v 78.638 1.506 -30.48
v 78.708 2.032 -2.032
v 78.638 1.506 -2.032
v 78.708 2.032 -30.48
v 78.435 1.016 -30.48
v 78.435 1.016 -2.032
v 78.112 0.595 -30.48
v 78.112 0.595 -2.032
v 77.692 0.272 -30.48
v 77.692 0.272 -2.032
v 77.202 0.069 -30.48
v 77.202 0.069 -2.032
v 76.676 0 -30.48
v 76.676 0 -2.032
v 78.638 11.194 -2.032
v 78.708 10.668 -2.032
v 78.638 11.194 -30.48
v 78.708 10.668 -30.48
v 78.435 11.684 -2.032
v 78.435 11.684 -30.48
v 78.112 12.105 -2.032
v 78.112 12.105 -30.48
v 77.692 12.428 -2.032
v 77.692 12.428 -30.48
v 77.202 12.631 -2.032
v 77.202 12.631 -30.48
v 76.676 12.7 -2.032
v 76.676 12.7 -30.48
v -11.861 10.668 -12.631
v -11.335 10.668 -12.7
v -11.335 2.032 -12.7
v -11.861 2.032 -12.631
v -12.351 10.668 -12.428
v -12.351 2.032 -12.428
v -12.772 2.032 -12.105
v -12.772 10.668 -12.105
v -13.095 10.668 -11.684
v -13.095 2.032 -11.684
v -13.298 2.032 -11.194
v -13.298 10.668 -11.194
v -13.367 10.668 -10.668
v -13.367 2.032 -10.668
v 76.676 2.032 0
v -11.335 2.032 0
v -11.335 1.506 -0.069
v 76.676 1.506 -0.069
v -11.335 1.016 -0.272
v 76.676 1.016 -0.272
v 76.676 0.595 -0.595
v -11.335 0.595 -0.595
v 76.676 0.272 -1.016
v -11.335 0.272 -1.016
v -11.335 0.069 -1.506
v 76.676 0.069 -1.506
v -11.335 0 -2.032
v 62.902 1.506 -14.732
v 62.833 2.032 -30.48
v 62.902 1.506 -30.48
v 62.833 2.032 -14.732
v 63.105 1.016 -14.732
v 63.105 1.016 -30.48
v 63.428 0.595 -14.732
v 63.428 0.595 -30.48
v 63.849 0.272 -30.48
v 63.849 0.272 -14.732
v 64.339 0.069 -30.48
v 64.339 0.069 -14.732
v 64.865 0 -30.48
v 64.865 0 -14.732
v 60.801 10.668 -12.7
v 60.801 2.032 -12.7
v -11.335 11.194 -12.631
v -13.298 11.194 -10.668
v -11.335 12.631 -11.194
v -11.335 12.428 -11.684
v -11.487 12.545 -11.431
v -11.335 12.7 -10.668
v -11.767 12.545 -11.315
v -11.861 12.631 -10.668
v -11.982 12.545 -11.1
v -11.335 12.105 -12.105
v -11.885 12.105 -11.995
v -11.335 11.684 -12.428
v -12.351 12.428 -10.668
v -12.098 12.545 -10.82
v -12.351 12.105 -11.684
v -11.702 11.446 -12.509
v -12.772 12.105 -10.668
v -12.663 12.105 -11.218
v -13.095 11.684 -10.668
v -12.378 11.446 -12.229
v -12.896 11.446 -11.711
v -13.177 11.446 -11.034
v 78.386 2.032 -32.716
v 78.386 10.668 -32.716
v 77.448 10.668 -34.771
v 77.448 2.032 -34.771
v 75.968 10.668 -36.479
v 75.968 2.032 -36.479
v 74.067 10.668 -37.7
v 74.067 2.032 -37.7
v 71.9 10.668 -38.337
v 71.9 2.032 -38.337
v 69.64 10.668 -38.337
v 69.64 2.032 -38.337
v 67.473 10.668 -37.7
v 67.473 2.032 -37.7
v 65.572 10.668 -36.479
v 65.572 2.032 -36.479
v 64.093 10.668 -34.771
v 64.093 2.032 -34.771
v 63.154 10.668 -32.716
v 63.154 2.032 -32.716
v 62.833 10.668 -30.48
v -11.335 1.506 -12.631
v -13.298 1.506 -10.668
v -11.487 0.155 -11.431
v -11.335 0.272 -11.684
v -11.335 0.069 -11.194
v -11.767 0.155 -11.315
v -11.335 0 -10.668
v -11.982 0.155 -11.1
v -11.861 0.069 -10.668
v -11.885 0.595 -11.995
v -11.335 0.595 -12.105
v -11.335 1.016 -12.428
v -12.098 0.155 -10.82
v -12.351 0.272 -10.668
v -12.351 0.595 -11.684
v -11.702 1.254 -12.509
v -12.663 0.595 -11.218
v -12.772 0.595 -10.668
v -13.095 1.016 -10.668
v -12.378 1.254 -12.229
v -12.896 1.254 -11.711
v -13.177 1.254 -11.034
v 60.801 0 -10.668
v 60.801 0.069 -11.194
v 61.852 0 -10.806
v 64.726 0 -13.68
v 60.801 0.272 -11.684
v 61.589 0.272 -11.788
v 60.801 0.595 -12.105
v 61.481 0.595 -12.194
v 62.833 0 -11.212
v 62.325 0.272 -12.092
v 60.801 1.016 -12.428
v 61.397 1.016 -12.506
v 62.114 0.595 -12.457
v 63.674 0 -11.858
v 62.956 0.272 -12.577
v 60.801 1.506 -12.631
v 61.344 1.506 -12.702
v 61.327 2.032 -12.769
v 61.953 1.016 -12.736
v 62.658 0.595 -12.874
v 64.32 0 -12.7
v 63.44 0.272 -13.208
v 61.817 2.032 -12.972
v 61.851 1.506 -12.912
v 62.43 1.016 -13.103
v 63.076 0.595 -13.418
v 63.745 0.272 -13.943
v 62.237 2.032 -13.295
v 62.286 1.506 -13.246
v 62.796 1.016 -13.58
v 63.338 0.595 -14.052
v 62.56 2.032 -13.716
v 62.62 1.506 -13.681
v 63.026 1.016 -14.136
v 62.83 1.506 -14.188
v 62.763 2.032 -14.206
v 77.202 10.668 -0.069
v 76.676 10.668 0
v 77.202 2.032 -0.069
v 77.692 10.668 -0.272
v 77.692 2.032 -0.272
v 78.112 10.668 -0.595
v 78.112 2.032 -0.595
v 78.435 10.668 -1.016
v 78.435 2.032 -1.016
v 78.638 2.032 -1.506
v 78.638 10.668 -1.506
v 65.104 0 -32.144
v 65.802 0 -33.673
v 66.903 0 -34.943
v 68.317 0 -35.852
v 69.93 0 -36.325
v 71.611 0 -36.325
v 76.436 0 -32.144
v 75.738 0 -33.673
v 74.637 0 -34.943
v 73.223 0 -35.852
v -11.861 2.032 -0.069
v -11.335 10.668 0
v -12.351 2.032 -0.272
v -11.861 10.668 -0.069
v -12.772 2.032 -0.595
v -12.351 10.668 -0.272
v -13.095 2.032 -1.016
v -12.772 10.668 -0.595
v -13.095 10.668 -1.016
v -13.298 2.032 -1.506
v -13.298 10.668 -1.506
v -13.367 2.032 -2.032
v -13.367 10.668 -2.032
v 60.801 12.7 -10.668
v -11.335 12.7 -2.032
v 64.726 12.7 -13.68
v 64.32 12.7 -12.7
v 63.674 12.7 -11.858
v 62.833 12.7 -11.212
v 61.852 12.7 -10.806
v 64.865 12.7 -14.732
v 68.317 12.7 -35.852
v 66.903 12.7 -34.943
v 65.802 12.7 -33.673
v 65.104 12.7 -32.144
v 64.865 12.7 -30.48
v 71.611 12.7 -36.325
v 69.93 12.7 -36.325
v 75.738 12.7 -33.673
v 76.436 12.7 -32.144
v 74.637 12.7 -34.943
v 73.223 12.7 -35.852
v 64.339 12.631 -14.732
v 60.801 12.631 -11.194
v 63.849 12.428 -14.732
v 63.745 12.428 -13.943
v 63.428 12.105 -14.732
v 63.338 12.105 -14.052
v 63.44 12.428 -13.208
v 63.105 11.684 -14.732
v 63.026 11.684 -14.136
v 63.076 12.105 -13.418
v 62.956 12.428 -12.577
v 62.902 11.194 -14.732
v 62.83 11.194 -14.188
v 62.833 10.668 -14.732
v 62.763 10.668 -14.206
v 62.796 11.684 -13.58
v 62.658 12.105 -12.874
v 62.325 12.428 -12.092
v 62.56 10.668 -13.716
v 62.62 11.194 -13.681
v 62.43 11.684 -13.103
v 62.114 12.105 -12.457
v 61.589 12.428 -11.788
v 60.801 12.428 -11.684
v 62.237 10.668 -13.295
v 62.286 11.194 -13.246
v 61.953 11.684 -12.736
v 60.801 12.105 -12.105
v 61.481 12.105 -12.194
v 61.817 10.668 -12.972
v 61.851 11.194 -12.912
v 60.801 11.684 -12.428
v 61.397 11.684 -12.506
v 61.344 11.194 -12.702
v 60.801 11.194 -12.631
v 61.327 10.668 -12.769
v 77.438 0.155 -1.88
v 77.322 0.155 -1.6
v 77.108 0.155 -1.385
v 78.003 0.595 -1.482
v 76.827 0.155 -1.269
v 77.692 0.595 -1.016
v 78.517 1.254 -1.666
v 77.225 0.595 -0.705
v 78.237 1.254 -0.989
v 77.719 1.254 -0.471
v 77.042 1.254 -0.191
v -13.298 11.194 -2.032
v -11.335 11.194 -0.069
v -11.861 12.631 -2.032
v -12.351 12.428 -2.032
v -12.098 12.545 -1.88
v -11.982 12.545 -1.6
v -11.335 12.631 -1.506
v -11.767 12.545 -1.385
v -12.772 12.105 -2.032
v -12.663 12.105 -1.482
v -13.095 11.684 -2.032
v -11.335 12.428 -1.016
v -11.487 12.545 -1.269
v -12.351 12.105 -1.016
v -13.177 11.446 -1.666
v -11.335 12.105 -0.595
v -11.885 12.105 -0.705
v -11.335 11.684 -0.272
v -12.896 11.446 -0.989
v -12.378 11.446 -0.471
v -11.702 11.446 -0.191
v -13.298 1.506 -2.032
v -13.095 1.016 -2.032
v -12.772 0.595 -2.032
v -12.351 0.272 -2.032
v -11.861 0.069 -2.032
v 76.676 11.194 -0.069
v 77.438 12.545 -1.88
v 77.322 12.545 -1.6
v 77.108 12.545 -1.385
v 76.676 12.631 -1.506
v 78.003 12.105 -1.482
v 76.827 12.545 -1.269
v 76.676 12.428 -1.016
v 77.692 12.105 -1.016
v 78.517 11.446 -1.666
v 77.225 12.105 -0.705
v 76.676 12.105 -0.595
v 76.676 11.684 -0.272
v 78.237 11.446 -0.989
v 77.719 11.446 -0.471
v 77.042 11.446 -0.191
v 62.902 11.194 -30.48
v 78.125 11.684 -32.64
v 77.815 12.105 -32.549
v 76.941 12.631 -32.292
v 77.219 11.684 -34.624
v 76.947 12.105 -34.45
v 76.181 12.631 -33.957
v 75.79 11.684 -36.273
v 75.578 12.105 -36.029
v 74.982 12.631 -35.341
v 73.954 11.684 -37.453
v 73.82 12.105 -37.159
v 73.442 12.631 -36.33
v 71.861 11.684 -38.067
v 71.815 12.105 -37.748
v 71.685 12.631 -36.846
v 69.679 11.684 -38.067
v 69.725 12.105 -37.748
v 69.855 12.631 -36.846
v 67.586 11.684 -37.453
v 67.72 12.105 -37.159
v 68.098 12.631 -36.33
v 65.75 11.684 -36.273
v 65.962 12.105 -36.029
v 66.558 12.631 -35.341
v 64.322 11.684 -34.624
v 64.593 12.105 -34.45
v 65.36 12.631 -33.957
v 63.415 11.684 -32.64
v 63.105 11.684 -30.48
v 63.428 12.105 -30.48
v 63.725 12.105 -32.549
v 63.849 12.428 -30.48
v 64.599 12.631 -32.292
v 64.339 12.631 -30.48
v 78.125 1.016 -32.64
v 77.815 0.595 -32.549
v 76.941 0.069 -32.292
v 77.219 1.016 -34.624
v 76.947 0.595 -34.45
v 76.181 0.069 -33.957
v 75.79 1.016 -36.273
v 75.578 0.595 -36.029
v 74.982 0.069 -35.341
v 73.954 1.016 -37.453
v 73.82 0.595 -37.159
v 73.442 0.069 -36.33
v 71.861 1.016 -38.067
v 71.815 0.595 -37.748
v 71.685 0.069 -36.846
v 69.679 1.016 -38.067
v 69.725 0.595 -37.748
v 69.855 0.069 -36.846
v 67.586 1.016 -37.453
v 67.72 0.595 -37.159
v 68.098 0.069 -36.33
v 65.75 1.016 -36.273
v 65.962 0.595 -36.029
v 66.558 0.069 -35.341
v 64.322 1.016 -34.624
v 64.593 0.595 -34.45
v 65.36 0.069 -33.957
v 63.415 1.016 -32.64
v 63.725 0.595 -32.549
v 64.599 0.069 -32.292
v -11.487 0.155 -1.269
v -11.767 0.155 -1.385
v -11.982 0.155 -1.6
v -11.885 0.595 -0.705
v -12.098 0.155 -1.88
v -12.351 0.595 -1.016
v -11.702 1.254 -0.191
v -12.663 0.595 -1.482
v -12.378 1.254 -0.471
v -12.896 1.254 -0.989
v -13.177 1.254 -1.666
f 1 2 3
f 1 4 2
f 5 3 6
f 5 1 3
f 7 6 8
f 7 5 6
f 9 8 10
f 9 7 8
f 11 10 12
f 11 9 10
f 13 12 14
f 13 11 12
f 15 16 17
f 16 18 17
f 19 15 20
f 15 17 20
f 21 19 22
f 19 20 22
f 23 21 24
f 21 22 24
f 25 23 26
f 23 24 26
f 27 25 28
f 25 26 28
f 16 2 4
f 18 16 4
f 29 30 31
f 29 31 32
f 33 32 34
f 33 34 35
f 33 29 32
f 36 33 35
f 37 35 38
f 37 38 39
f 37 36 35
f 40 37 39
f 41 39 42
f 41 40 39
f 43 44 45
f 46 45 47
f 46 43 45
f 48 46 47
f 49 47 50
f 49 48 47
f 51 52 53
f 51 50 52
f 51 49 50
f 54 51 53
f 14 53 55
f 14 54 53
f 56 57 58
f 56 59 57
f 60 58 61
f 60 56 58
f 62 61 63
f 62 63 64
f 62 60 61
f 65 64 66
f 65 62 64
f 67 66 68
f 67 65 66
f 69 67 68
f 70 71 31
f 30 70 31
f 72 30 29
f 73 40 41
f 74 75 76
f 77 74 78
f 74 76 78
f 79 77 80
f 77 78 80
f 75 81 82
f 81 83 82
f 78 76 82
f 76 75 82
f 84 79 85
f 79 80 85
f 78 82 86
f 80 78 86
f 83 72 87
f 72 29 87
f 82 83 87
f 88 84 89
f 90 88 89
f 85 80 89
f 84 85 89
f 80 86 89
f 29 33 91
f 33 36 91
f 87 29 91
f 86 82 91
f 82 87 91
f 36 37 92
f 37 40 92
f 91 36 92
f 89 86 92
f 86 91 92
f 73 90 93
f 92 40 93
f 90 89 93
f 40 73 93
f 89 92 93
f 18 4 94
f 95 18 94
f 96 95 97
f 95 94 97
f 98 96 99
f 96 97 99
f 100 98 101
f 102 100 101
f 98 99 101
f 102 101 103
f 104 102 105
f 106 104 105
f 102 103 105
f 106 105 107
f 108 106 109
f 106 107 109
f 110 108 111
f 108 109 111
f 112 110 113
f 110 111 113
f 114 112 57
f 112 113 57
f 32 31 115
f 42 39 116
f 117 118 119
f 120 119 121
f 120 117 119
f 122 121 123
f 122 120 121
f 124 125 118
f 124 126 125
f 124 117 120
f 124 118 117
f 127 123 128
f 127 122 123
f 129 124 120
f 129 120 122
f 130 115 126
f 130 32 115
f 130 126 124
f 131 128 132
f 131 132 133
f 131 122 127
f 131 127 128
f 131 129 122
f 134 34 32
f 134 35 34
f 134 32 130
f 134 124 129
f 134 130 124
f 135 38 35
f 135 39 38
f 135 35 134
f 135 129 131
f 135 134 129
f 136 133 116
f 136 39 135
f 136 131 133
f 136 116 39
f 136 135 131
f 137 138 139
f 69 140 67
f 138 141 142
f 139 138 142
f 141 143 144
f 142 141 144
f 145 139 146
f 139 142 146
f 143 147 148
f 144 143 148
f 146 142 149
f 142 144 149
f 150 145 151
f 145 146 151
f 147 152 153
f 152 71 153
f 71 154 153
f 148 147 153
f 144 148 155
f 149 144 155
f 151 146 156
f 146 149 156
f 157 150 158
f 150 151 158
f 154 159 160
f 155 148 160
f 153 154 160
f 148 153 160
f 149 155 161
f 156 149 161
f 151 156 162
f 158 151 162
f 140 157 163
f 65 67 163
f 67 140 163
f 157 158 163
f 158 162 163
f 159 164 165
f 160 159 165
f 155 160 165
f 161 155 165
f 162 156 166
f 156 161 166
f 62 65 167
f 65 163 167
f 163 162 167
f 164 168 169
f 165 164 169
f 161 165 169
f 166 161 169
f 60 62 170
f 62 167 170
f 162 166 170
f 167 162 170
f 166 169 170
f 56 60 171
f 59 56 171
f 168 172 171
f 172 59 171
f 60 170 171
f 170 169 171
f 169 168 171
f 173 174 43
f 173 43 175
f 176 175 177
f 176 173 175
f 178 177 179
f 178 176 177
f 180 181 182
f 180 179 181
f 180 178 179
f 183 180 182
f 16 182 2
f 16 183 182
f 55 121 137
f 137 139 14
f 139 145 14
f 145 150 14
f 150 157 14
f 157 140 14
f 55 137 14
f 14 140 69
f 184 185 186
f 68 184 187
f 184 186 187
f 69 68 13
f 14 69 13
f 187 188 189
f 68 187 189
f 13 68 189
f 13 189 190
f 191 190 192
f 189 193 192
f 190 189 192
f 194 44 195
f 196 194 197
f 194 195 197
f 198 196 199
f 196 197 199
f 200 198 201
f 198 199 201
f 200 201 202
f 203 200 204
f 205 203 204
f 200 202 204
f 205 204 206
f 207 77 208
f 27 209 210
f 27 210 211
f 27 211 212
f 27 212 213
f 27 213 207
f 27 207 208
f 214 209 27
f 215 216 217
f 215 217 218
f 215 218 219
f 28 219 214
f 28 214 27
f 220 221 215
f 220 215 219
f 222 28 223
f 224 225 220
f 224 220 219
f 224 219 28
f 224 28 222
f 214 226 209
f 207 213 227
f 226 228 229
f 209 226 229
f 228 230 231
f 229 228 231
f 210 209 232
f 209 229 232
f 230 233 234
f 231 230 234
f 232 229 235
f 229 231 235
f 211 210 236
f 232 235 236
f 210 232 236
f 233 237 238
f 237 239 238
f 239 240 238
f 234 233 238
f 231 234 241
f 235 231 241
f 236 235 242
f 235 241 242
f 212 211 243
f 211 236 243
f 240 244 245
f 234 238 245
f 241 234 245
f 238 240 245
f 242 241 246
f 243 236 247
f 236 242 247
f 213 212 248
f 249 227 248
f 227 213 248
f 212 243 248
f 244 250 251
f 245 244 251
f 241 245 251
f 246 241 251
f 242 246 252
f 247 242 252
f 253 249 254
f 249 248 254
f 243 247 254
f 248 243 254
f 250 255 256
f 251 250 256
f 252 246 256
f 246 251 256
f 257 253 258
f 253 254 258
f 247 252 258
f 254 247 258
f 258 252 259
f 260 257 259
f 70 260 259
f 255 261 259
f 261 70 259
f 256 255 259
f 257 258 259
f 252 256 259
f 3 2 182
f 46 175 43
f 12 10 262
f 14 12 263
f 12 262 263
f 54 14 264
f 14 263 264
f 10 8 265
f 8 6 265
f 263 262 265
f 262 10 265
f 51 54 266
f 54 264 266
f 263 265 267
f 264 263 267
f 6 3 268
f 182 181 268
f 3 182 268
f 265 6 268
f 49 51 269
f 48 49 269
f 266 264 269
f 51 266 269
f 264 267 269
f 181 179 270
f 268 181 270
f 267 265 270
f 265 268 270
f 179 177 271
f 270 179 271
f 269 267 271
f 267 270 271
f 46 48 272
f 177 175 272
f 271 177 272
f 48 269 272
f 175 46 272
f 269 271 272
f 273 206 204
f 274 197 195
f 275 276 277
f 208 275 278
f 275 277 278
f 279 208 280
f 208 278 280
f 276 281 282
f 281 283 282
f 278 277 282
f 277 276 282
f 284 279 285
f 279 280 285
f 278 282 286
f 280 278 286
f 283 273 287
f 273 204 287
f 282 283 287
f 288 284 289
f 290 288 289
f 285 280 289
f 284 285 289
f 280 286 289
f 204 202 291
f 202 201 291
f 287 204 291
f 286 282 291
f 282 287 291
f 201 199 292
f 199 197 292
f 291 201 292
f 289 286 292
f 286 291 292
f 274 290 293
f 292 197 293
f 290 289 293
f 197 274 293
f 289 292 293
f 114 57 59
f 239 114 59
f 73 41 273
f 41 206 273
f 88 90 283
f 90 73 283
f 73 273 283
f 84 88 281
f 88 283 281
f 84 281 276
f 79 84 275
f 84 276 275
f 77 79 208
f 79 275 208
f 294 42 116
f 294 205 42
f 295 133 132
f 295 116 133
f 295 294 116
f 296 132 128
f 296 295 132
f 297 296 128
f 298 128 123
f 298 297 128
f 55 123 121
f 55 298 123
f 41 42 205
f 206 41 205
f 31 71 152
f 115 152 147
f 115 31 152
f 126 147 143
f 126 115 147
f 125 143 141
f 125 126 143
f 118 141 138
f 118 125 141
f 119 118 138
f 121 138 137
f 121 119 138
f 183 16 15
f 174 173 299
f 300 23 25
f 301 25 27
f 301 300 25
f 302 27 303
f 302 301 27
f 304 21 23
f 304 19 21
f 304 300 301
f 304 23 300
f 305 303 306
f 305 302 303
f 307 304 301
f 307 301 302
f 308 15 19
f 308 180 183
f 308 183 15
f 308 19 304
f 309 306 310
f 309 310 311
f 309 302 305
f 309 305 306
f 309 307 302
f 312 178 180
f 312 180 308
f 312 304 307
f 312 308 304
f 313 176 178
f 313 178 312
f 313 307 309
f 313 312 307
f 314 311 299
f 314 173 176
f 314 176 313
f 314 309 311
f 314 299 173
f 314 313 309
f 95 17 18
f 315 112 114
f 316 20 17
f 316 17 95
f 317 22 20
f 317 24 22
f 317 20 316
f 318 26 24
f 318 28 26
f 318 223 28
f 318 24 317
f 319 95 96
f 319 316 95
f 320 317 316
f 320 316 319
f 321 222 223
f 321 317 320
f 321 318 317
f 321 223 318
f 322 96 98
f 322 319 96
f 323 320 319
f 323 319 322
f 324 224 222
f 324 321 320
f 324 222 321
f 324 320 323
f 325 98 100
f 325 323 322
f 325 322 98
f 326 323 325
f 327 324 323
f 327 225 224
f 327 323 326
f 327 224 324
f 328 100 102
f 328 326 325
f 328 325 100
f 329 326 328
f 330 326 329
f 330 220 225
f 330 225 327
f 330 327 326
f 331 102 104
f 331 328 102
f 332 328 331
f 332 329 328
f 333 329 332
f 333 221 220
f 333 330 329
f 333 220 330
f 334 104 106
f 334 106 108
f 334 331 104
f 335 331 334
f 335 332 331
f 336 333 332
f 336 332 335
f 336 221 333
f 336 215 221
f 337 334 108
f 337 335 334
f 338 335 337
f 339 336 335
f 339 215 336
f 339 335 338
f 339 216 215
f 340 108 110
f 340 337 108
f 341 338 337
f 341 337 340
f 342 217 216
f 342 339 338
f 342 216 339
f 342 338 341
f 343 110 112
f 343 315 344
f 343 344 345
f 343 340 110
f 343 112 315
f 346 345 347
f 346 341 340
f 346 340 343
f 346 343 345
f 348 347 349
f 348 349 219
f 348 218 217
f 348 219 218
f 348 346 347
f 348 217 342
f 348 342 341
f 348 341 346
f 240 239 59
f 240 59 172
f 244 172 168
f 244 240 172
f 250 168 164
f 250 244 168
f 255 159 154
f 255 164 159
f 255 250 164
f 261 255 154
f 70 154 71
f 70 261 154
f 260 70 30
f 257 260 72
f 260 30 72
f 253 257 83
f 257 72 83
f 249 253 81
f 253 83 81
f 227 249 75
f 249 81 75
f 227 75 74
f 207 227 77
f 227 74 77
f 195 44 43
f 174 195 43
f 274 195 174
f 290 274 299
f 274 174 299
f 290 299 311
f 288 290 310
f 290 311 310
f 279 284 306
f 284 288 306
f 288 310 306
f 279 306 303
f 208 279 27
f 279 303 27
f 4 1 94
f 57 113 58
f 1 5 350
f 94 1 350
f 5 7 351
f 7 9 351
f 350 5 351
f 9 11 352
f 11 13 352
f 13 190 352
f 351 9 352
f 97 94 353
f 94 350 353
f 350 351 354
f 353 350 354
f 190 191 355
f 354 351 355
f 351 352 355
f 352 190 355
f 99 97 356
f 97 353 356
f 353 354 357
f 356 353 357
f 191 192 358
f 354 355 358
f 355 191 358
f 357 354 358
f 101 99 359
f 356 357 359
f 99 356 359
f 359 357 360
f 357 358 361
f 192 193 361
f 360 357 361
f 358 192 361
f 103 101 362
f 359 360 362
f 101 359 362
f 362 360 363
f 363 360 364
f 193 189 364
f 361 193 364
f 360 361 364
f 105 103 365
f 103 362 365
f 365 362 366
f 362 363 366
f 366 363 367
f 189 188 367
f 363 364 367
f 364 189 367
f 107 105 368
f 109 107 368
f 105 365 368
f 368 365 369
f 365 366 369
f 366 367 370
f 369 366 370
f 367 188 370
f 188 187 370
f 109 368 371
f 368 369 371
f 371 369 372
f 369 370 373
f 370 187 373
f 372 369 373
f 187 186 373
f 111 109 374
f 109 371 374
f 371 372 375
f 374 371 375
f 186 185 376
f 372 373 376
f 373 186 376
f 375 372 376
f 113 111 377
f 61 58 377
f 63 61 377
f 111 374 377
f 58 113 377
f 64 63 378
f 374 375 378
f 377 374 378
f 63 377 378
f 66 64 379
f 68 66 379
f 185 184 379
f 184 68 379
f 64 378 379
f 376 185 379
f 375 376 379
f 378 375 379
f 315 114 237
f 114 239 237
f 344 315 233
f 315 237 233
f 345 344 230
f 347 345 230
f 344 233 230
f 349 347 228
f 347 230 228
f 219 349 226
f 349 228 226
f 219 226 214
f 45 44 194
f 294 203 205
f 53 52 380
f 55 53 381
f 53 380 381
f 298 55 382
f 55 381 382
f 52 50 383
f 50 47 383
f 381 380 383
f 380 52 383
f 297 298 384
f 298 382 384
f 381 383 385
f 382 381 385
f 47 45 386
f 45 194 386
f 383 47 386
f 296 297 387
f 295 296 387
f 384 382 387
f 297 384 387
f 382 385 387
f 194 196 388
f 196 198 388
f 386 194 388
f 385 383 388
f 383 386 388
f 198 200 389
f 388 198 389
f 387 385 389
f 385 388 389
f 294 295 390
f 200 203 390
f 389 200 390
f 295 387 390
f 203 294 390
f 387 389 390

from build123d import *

# Parameters (mm, degrees)
BOSS_EXTRUDE2_DEPTH = 12.7
FILLET1_R           = 2.032


with BuildPart() as part:
    # Sketch1 → Boss-Extrude2 (new body)
    with BuildSketch(Plane(origin=(0, 0, 0), x_dir=(1, 0, 0), z_dir=(0, 1, 0))):
        with BuildLine():
            Line((-13.367399368, 0), (78.707600632, 0))
            Line((78.707600632, 0), (78.707600632, 30.48))
            ThreePointArc((78.707600632, 30.48), (70.770100632, 38.4175), (62.832600632, 30.48))
            Line((62.832600632, 30.48), (62.832600632, 12.7))
            Line((62.832600632, 12.7), (-13.367399368, 12.7))
            Line((-13.367399368, 12.7), (-13.367399368, 0))
        make_face()
    extrude(amount=BOSS_EXTRUDE2_DEPTH)

    # Fillet1
    fillet1_edges = [part.edges().sort_by_distance(p)[0] for p in [
        (-13.367399368, 6.35, -12.7),
        (62.832600632, 6.35, -12.7),
        (78.707600632, 6.35, 0),
        (-13.367399368, 6.35, 0),
        (78.707600632, 12.7, -15.24),
        (70.770100632, 12.7, -38.4175),
        (62.832600632, 12.7, -21.59),
        (24.732600632, 12.7, -12.7),
        (-13.367399368, 12.7, -6.35),
        (24.732600632, 0, -12.7),
        (62.832600632, 0, -21.59),
        (70.770100632, 0, -38.4175),
        (78.707600632, 0, -15.24),
        (32.670100632, 0, 0),
        (-13.367399368, 0, -6.35),
        (32.670100632, 12.7, 0),
    ]]
    fillet(fillet1_edges, radius=FILLET1_R)


solid = part.part
